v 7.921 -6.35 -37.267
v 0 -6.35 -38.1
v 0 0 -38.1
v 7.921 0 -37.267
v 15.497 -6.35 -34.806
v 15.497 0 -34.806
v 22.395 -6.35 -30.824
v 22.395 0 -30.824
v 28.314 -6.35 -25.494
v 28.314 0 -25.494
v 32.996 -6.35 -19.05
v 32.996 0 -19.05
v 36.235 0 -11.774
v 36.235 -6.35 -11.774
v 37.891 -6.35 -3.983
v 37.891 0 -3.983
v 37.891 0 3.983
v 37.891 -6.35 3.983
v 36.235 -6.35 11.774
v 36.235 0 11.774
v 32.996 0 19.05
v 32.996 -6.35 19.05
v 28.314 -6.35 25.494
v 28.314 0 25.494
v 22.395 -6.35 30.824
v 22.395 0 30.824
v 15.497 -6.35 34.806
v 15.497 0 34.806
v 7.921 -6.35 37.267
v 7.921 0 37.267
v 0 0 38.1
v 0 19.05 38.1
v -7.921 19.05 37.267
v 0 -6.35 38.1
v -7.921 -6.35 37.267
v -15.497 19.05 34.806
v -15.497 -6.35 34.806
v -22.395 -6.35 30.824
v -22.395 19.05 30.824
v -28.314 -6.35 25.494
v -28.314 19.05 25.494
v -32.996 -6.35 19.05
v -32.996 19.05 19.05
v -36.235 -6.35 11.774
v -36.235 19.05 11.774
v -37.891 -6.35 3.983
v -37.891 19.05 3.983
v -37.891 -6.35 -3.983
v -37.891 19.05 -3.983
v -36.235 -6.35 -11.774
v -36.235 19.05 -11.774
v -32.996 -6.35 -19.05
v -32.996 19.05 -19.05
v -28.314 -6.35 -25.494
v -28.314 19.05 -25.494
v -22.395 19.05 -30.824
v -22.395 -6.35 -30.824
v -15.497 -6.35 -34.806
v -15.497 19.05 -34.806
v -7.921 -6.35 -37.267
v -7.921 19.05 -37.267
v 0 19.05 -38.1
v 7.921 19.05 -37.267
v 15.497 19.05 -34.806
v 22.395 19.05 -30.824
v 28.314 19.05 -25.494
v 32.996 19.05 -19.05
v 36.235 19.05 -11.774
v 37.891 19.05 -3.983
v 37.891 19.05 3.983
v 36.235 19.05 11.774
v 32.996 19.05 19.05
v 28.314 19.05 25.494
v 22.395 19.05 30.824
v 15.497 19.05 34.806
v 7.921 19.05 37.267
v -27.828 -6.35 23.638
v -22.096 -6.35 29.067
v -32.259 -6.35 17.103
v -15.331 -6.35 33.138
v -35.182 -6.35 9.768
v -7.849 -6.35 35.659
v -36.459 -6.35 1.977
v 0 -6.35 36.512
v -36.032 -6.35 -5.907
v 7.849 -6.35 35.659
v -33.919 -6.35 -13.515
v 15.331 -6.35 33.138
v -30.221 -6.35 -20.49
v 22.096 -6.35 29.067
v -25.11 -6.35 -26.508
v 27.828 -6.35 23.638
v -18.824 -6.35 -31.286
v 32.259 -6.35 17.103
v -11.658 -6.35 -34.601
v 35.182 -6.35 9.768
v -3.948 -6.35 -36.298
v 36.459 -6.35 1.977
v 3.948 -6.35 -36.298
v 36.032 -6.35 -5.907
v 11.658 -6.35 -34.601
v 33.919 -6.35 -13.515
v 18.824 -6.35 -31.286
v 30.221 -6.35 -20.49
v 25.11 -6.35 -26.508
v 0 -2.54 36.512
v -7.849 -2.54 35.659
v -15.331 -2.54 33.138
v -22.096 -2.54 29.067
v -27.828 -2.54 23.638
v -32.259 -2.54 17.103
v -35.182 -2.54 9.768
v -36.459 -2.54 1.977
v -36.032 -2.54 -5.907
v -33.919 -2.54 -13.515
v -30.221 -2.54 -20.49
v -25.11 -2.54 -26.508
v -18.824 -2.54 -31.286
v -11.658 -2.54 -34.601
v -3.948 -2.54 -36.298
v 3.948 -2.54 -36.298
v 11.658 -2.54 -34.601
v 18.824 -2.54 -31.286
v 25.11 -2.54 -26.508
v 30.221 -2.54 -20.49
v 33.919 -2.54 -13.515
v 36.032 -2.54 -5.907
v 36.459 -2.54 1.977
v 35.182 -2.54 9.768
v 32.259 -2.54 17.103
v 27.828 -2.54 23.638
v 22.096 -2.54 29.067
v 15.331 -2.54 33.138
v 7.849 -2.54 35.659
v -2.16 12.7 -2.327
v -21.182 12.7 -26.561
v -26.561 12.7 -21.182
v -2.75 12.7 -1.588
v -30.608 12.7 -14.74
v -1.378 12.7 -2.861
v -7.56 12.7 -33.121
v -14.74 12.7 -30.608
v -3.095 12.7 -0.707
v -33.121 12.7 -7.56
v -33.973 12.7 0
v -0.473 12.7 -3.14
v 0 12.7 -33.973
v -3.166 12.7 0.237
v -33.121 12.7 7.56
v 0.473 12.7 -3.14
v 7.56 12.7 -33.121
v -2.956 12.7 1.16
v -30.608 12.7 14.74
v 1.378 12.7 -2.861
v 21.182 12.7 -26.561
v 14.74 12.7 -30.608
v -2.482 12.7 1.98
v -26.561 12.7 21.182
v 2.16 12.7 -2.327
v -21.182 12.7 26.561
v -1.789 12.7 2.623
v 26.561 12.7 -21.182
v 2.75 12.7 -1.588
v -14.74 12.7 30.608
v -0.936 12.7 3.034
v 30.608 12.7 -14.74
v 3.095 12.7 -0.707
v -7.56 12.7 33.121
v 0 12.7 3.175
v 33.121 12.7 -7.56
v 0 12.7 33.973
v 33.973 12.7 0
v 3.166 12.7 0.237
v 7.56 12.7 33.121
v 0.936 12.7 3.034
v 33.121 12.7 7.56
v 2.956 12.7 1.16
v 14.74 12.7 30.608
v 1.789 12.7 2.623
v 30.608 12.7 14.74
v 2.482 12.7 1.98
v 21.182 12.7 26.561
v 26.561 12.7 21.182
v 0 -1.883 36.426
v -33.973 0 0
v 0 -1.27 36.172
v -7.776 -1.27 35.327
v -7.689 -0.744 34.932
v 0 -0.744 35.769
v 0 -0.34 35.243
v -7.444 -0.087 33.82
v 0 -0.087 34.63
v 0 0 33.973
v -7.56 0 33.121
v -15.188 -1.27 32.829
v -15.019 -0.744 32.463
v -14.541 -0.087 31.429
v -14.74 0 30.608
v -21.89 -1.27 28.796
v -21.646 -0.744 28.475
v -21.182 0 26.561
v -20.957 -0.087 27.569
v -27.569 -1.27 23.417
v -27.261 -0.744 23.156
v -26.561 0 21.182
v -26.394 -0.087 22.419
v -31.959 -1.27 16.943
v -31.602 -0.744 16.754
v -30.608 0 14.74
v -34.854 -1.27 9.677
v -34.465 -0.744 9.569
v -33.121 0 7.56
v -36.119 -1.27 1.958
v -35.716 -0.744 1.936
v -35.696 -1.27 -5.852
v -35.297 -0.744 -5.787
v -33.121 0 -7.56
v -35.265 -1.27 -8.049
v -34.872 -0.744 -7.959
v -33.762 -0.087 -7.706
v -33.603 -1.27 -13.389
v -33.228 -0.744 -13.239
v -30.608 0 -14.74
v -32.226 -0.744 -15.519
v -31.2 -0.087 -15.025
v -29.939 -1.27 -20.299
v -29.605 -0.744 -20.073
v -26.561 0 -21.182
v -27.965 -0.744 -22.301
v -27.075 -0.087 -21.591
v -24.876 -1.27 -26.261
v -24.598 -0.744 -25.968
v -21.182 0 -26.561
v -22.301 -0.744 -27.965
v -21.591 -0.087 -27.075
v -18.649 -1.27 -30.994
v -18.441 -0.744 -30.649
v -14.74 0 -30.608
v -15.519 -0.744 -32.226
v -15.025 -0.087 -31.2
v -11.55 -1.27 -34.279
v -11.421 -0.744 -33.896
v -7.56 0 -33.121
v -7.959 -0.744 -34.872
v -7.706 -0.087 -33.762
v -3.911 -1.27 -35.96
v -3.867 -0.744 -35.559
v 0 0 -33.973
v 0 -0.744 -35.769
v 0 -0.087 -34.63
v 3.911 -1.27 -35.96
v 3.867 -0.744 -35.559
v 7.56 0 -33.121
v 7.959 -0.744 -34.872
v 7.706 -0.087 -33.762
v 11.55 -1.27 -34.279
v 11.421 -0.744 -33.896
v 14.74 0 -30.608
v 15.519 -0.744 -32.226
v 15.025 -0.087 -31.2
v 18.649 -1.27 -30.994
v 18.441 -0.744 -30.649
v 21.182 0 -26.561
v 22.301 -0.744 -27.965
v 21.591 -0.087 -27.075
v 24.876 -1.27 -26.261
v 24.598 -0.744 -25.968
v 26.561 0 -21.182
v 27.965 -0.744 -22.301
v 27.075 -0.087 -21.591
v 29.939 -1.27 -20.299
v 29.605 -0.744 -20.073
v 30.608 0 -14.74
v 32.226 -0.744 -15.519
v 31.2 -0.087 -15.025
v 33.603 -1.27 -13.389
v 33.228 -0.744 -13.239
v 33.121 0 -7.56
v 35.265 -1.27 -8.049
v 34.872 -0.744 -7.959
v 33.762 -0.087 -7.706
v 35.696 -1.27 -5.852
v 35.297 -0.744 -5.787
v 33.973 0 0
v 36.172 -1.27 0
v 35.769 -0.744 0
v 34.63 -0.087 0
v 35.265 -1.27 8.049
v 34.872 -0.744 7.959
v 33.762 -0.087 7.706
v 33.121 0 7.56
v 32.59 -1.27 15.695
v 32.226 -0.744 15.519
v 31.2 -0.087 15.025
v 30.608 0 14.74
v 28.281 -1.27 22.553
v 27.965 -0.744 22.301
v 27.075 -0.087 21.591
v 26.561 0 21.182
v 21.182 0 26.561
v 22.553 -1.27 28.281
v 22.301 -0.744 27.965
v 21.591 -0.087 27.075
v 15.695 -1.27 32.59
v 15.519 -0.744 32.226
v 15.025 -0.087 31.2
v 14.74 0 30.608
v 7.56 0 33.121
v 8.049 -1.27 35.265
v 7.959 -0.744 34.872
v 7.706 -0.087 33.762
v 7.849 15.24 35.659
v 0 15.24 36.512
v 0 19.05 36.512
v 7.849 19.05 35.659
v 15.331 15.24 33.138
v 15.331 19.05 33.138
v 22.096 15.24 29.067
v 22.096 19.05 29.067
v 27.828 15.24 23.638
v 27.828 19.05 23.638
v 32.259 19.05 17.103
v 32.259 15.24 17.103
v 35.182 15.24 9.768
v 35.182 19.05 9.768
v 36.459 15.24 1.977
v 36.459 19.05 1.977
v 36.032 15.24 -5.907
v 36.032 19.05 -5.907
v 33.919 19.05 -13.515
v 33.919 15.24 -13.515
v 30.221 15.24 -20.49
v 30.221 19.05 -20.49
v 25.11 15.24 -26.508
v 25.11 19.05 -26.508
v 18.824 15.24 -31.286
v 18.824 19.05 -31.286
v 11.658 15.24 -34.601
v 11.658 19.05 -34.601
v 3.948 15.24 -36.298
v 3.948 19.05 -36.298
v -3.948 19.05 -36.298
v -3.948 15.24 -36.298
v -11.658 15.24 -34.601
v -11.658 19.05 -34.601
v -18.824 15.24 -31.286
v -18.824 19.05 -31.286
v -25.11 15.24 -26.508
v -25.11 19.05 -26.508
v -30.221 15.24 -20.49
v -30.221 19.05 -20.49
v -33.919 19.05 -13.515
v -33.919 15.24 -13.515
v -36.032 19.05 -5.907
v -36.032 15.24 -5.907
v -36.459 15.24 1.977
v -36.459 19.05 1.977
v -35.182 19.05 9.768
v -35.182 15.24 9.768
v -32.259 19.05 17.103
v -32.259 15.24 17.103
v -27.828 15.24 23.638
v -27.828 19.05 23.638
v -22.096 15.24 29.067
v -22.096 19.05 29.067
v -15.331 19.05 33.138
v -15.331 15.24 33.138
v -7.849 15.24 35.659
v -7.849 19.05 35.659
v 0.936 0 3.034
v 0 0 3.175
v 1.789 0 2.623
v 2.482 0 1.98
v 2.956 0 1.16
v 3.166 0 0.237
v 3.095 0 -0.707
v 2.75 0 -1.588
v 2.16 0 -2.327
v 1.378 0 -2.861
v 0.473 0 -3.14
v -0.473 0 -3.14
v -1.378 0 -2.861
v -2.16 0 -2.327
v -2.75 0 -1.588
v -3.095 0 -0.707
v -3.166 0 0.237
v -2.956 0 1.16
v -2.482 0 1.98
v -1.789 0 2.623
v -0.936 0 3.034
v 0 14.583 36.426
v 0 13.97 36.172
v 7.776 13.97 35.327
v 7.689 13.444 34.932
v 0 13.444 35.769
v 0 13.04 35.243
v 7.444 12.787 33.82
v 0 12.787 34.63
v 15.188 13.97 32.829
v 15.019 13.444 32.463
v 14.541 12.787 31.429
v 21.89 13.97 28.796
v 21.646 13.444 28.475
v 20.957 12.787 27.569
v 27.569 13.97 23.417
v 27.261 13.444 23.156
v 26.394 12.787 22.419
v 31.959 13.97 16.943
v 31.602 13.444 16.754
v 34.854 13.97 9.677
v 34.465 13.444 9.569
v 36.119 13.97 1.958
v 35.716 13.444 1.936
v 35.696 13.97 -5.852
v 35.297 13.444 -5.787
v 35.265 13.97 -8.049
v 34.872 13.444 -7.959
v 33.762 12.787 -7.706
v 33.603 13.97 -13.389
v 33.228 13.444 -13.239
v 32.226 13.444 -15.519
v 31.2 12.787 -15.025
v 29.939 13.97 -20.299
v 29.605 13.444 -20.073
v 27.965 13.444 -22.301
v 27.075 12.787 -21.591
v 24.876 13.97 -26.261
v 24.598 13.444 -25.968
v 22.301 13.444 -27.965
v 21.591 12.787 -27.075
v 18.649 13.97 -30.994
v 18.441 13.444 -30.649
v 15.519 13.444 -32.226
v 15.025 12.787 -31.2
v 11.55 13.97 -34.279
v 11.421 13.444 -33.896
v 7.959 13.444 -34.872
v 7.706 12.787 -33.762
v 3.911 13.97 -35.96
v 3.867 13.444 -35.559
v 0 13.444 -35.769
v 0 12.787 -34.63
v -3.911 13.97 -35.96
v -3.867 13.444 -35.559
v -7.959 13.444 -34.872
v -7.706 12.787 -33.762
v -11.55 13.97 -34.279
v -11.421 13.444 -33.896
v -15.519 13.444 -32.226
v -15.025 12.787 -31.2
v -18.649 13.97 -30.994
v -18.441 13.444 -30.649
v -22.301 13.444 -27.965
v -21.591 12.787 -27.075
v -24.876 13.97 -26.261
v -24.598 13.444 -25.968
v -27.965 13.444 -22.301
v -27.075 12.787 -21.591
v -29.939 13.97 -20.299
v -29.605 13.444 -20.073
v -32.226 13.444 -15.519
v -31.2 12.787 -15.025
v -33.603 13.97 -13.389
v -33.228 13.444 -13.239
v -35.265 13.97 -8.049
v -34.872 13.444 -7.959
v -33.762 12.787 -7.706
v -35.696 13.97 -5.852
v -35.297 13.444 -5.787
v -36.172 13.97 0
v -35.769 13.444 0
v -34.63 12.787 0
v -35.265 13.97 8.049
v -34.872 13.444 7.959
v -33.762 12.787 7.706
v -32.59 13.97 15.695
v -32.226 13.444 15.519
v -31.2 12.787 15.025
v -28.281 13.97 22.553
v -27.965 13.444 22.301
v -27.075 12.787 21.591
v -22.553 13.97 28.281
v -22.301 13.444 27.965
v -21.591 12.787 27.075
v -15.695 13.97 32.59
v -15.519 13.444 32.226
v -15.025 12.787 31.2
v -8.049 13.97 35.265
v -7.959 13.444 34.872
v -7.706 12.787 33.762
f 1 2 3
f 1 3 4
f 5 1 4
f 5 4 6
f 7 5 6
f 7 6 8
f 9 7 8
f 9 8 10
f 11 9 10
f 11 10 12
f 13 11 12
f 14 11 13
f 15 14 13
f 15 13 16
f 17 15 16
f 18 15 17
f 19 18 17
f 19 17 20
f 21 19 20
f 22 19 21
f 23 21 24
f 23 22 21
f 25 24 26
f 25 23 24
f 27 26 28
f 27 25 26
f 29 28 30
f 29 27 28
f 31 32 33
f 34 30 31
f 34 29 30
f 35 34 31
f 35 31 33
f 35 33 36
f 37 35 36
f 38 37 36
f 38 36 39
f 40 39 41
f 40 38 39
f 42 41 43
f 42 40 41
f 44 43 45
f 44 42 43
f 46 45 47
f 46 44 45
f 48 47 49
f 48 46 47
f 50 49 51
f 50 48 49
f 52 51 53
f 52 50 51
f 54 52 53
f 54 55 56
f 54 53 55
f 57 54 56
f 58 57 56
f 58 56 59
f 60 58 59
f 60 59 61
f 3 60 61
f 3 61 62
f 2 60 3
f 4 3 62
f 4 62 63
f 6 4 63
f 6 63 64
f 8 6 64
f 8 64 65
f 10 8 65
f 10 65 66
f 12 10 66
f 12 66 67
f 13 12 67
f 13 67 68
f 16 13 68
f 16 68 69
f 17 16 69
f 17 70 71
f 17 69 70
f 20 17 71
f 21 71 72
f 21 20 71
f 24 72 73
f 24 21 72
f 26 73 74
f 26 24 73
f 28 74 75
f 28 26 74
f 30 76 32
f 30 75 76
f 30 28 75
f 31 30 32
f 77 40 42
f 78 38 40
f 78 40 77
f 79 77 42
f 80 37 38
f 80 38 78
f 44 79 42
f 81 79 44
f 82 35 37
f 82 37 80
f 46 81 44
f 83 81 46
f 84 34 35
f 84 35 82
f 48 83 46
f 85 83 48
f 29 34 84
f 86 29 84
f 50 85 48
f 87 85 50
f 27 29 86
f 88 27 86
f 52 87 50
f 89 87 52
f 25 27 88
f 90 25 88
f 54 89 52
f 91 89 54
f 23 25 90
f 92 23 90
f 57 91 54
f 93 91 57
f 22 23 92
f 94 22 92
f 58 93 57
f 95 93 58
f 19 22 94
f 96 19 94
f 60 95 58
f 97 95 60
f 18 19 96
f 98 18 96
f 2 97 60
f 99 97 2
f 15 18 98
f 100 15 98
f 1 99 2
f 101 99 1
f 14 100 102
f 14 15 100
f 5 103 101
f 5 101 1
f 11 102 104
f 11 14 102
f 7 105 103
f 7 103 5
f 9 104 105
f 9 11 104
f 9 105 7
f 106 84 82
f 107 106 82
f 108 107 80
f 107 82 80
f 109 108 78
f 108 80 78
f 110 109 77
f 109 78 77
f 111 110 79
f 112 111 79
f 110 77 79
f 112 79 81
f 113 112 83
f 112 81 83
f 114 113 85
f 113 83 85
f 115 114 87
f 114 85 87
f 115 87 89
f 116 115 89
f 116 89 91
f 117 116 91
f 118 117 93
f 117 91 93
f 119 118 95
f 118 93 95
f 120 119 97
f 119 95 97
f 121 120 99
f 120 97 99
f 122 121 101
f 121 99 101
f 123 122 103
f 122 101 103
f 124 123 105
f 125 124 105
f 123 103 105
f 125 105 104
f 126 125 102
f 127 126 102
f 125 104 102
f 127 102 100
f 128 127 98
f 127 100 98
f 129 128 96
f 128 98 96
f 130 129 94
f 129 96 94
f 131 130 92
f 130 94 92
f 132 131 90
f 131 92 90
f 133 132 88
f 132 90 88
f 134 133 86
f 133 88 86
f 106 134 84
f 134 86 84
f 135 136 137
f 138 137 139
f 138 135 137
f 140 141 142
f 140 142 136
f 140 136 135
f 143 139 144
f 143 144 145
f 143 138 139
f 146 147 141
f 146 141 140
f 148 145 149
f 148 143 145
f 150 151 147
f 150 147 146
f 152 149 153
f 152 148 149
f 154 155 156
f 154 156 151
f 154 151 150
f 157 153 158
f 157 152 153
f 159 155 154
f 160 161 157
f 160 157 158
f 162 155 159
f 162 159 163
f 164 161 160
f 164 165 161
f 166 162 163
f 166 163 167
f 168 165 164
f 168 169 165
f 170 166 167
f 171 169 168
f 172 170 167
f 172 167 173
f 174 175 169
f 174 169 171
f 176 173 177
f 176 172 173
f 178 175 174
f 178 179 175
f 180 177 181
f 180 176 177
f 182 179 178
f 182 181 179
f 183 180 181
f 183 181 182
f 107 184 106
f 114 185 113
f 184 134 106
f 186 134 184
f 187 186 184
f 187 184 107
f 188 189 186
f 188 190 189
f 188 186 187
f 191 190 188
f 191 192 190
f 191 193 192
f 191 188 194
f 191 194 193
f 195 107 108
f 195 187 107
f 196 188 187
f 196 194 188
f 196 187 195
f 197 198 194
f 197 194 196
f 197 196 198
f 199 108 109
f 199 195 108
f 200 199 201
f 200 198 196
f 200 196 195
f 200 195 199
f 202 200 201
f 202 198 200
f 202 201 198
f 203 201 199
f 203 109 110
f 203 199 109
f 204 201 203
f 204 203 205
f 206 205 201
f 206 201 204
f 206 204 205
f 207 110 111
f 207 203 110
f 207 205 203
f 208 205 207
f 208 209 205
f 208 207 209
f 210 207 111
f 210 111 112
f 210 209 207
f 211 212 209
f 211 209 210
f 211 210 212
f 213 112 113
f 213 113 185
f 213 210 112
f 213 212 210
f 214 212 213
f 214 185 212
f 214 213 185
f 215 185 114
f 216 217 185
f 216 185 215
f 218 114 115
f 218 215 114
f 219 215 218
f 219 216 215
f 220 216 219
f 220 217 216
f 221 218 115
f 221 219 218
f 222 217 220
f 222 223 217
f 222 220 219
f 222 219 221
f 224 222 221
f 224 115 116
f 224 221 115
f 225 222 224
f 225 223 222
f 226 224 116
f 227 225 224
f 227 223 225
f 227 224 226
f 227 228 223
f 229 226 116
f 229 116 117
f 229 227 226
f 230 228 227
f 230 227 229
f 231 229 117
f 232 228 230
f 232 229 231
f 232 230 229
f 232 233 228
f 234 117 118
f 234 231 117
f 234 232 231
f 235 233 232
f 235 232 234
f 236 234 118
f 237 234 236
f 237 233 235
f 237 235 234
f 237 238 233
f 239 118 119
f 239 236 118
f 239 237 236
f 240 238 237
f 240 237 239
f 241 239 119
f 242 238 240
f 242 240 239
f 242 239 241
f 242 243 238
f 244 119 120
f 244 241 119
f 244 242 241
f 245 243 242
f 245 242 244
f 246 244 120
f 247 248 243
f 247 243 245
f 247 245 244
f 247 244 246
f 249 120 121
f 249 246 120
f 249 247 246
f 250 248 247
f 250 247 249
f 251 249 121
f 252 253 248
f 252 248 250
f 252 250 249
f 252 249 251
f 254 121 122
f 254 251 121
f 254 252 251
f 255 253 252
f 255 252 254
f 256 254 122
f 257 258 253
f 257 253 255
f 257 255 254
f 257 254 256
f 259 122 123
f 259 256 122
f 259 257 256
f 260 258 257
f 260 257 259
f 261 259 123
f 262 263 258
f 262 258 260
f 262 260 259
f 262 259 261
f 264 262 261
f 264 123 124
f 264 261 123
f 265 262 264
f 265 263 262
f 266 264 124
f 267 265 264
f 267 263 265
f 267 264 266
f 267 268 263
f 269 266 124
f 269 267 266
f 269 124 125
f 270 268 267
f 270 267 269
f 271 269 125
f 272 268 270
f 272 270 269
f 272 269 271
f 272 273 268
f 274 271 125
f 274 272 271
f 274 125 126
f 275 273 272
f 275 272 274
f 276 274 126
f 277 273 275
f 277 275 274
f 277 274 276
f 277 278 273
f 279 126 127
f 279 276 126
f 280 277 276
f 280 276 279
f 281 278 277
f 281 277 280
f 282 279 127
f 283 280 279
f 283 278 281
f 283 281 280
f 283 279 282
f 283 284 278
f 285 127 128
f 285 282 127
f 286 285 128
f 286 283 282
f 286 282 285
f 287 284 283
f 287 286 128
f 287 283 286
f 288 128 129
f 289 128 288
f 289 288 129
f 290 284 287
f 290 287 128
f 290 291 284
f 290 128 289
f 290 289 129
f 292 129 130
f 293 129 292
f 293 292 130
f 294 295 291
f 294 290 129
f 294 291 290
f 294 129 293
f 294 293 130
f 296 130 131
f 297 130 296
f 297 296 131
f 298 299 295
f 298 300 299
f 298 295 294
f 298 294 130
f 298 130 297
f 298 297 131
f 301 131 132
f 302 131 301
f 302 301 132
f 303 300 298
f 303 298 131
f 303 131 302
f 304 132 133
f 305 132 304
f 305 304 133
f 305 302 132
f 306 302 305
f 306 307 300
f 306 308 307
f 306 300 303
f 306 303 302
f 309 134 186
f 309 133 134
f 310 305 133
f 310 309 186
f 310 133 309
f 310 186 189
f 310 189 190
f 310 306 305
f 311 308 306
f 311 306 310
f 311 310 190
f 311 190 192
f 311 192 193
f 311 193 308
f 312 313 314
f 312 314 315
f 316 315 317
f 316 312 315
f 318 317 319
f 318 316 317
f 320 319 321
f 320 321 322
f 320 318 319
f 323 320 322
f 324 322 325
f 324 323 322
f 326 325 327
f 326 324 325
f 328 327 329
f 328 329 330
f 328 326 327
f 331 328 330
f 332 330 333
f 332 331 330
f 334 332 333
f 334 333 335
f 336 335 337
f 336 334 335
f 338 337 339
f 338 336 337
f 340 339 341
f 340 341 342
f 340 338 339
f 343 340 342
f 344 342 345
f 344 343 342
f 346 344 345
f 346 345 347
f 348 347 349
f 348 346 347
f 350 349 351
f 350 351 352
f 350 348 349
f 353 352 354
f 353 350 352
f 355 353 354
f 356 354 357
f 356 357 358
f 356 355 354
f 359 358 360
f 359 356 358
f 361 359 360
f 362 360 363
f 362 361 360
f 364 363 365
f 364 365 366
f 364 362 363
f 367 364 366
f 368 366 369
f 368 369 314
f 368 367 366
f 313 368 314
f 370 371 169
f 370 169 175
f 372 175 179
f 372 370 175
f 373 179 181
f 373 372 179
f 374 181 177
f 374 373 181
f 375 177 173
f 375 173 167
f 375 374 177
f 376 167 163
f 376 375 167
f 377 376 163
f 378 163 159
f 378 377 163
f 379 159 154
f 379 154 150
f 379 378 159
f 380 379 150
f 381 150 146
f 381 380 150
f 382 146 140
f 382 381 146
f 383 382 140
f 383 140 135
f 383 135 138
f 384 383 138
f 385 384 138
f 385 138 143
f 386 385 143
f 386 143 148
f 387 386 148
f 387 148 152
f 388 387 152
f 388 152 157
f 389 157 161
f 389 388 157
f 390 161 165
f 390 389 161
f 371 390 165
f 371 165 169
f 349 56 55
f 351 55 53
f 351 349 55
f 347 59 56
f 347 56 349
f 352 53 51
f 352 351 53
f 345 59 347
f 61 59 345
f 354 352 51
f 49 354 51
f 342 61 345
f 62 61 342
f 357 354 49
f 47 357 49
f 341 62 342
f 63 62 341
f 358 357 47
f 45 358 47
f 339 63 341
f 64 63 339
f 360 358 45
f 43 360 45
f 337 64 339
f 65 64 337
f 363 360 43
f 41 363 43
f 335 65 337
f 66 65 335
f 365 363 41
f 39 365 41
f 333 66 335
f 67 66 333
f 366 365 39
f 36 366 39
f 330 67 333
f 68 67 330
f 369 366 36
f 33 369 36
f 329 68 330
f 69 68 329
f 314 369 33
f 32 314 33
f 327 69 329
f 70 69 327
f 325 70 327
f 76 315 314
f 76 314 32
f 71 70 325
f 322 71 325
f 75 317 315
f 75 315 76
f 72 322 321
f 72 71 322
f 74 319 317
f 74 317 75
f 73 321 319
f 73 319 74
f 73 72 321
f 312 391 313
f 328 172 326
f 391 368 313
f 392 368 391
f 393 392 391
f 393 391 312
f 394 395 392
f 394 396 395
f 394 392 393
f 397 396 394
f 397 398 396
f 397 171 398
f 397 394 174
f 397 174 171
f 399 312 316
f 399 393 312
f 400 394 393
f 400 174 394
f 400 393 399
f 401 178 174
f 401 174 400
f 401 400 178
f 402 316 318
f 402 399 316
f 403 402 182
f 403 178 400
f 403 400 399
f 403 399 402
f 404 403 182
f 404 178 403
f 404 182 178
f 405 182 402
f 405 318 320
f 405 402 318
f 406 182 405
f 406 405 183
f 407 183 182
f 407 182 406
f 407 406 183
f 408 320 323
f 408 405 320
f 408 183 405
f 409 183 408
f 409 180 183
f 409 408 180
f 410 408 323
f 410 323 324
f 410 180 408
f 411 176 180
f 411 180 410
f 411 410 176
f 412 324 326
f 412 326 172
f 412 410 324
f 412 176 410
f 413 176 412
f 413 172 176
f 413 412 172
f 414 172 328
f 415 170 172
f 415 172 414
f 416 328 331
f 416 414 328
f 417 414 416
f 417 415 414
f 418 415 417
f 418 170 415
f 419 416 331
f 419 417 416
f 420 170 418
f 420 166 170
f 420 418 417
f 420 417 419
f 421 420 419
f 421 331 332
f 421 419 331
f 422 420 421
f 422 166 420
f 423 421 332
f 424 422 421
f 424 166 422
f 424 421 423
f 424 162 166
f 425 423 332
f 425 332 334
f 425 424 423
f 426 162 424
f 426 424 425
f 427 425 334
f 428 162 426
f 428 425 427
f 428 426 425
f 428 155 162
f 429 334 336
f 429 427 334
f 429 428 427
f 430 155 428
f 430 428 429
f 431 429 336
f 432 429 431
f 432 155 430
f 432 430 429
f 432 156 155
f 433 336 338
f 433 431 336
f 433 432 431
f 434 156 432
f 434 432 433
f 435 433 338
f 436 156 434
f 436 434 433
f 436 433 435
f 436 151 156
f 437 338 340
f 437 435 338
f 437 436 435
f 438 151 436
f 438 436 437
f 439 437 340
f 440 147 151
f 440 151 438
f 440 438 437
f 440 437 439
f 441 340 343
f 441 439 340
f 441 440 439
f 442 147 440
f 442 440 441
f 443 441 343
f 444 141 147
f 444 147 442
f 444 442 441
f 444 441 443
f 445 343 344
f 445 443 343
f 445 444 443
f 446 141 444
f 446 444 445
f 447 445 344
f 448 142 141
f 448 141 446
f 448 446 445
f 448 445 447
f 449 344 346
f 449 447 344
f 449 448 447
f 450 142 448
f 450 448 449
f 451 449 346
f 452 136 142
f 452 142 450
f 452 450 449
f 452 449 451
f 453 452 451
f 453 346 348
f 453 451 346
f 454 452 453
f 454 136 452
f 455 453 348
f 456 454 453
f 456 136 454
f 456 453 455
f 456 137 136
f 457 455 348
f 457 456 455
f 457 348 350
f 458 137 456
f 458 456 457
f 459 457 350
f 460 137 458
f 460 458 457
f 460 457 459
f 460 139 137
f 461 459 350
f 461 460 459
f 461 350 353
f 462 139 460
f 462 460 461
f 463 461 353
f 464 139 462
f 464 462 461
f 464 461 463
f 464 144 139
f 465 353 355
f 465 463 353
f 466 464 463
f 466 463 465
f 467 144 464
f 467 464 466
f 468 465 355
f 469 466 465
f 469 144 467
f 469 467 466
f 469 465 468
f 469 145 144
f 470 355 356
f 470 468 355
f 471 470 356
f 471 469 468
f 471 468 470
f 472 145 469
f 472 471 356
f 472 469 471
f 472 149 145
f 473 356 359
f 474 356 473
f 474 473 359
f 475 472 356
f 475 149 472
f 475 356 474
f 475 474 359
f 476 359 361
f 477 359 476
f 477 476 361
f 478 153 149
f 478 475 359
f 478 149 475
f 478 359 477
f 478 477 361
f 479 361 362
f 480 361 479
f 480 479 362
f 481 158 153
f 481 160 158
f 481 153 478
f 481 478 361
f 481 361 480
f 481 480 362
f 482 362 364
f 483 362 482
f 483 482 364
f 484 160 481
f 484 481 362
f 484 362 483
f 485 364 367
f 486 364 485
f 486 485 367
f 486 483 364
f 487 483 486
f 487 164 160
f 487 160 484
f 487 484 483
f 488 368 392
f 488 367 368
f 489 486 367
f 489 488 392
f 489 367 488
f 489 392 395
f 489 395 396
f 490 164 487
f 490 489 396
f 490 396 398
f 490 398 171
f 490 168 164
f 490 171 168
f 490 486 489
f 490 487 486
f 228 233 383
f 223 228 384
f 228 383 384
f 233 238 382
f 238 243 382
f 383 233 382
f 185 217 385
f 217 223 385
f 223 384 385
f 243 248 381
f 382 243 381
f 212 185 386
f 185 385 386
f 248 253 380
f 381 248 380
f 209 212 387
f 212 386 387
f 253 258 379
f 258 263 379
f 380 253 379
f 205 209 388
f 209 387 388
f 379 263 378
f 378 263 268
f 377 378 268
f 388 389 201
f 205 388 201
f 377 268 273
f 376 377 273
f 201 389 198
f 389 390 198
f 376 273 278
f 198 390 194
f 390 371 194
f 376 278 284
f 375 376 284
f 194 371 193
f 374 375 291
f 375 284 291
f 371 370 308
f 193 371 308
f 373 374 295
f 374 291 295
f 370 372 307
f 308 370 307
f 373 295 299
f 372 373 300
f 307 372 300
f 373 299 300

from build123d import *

# Parameters (mm, degrees)
SKETCH1_R           = 38.1
SKETCH1_R_2         = 3.175
BOSS_EXTRUDE1_DEPTH = 12.7
SKETCH2_R           = 38.1
SKETCH2_R_2         = 36.5125
BOSS_EXTRUDE2_DEPTH = 6.35
BOSS_EXTRUDE3_START = 6.35
SKETCH3_R           = 38.1
SKETCH3_R_2         = 36.5125
BOSS_EXTRUDE3_DEPTH = 6.35
FILLET1_R           = 2.54


with BuildPart() as part:
    # Sketch1 → Boss-Extrude1 (new body)
    with BuildSketch(Plane(origin=(0, 0, 0), x_dir=(1, 0, 0), z_dir=(0, 1, 0))):
        with Locations(Location((0, 0, 0), (0, 0, 270))):
            Circle(SKETCH1_R)
        with Locations(Location((0, 0, 0), (0, 0, 270))):
            Circle(SKETCH1_R_2, mode=Mode.SUBTRACT)
    extrude(amount=BOSS_EXTRUDE1_DEPTH)

    # Sketch2 → Boss-Extrude2 (add)
    with BuildSketch(Plane(origin=(0, 12.7, 0), x_dir=(1, 0, 0), z_dir=(0, 1, 0))):
        with Locations(Location((0, 0, 0), (0, 0, 270))):
            Circle(SKETCH2_R)
        with Locations(Location((0, 0, 0), (0, 0, 270))):
            Circle(SKETCH2_R_2, mode=Mode.SUBTRACT)
    extrude(amount=BOSS_EXTRUDE2_DEPTH)

    # Sketch3 → Boss-Extrude3 (add)
    with BuildSketch(Plane.XZ.offset(BOSS_EXTRUDE3_START)):
        with Locations(Location((0, 0, 0), (0, 0, 270))):
            Circle(SKETCH3_R)
        with Locations(Location((0, 0, 0), (0, 0, 90))):
            Circle(SKETCH3_R_2, mode=Mode.SUBTRACT)
    extrude(amount=-BOSS_EXTRUDE3_DEPTH)

    # Fillet1
    fillet1_edges = [part.edges().sort_by_distance(p)[0] for p in [
        (0, 0, -36.5125),
        (0, 12.7, -36.5125),
    ]]
    fillet(fillet1_edges, radius=FILLET1_R)


solid = part.part
